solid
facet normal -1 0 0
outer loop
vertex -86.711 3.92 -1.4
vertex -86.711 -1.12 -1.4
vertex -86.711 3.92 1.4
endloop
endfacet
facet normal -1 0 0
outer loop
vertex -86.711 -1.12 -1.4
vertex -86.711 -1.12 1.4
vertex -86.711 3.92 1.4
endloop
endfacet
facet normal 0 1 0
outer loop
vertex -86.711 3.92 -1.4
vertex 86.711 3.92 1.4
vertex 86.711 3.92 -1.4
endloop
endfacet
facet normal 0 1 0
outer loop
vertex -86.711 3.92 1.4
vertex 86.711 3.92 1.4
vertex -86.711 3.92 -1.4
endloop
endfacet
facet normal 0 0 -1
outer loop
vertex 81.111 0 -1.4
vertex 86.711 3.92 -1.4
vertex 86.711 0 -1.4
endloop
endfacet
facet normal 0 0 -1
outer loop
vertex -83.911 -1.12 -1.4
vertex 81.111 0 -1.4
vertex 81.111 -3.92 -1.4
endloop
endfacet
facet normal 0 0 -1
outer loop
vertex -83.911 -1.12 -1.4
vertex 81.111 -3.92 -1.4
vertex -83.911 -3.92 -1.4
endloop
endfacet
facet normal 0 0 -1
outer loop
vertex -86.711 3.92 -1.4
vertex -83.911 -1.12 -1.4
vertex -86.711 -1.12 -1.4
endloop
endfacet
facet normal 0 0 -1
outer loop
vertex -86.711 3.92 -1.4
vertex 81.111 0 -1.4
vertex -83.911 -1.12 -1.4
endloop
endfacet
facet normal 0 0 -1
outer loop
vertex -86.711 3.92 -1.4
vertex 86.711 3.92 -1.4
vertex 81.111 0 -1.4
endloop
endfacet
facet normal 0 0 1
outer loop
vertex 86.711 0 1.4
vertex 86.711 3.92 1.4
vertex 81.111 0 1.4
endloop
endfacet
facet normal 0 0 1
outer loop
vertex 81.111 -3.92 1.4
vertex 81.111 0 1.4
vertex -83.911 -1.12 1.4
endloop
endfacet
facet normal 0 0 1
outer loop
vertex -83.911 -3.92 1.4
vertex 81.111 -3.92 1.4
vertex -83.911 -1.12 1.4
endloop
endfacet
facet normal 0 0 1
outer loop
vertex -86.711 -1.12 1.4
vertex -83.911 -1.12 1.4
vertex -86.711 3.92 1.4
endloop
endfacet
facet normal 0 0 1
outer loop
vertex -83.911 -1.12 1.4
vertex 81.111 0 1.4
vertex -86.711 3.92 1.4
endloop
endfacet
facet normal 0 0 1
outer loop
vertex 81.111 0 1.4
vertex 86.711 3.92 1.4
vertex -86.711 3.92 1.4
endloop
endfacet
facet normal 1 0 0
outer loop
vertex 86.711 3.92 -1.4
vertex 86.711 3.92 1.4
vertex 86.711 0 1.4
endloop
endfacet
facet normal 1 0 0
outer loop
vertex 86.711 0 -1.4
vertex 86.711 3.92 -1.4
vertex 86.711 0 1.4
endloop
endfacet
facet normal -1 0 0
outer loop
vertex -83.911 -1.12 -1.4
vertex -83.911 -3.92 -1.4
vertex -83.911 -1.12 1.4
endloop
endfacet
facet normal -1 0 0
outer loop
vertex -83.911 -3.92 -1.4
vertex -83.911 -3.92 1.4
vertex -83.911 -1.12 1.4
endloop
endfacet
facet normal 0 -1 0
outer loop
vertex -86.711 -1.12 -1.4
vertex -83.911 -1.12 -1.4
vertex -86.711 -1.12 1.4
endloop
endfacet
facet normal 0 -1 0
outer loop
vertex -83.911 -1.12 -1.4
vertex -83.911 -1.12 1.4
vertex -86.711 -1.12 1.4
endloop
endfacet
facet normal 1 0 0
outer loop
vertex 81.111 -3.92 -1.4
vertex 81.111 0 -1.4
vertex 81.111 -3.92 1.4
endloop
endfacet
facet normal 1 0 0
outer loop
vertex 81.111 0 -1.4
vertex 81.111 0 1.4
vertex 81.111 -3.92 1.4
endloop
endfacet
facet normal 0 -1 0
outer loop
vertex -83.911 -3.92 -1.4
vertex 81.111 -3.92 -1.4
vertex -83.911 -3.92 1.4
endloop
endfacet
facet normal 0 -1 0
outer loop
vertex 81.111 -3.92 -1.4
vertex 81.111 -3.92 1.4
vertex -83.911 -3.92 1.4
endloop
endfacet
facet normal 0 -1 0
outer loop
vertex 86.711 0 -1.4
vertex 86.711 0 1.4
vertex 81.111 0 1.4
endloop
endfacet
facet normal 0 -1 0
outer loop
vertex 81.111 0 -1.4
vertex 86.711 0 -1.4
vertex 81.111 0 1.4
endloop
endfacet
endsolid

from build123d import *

# Parameters (mm, degrees)
EXTRUDE_1_DEPTH = 1.4


with BuildPart() as part:
    # Эскиз1 → Бобышка-Вытянуть1 (new, symmetric)
    with BuildSketch(Plane.XY):
        Polygon((86.710588683, 0), (81.110588683, 0), (81.110588683, -3.92), (-83.910588683, -3.92), (-83.910588683, -1.12), (-86.710588683, -1.12), (-86.710588683, 3.92), (-43.02487952, 3.92), (86.710588683, 3.92), align=None)
    extrude(amount=EXTRUDE_1_DEPTH, both=True)


solid = part.part
